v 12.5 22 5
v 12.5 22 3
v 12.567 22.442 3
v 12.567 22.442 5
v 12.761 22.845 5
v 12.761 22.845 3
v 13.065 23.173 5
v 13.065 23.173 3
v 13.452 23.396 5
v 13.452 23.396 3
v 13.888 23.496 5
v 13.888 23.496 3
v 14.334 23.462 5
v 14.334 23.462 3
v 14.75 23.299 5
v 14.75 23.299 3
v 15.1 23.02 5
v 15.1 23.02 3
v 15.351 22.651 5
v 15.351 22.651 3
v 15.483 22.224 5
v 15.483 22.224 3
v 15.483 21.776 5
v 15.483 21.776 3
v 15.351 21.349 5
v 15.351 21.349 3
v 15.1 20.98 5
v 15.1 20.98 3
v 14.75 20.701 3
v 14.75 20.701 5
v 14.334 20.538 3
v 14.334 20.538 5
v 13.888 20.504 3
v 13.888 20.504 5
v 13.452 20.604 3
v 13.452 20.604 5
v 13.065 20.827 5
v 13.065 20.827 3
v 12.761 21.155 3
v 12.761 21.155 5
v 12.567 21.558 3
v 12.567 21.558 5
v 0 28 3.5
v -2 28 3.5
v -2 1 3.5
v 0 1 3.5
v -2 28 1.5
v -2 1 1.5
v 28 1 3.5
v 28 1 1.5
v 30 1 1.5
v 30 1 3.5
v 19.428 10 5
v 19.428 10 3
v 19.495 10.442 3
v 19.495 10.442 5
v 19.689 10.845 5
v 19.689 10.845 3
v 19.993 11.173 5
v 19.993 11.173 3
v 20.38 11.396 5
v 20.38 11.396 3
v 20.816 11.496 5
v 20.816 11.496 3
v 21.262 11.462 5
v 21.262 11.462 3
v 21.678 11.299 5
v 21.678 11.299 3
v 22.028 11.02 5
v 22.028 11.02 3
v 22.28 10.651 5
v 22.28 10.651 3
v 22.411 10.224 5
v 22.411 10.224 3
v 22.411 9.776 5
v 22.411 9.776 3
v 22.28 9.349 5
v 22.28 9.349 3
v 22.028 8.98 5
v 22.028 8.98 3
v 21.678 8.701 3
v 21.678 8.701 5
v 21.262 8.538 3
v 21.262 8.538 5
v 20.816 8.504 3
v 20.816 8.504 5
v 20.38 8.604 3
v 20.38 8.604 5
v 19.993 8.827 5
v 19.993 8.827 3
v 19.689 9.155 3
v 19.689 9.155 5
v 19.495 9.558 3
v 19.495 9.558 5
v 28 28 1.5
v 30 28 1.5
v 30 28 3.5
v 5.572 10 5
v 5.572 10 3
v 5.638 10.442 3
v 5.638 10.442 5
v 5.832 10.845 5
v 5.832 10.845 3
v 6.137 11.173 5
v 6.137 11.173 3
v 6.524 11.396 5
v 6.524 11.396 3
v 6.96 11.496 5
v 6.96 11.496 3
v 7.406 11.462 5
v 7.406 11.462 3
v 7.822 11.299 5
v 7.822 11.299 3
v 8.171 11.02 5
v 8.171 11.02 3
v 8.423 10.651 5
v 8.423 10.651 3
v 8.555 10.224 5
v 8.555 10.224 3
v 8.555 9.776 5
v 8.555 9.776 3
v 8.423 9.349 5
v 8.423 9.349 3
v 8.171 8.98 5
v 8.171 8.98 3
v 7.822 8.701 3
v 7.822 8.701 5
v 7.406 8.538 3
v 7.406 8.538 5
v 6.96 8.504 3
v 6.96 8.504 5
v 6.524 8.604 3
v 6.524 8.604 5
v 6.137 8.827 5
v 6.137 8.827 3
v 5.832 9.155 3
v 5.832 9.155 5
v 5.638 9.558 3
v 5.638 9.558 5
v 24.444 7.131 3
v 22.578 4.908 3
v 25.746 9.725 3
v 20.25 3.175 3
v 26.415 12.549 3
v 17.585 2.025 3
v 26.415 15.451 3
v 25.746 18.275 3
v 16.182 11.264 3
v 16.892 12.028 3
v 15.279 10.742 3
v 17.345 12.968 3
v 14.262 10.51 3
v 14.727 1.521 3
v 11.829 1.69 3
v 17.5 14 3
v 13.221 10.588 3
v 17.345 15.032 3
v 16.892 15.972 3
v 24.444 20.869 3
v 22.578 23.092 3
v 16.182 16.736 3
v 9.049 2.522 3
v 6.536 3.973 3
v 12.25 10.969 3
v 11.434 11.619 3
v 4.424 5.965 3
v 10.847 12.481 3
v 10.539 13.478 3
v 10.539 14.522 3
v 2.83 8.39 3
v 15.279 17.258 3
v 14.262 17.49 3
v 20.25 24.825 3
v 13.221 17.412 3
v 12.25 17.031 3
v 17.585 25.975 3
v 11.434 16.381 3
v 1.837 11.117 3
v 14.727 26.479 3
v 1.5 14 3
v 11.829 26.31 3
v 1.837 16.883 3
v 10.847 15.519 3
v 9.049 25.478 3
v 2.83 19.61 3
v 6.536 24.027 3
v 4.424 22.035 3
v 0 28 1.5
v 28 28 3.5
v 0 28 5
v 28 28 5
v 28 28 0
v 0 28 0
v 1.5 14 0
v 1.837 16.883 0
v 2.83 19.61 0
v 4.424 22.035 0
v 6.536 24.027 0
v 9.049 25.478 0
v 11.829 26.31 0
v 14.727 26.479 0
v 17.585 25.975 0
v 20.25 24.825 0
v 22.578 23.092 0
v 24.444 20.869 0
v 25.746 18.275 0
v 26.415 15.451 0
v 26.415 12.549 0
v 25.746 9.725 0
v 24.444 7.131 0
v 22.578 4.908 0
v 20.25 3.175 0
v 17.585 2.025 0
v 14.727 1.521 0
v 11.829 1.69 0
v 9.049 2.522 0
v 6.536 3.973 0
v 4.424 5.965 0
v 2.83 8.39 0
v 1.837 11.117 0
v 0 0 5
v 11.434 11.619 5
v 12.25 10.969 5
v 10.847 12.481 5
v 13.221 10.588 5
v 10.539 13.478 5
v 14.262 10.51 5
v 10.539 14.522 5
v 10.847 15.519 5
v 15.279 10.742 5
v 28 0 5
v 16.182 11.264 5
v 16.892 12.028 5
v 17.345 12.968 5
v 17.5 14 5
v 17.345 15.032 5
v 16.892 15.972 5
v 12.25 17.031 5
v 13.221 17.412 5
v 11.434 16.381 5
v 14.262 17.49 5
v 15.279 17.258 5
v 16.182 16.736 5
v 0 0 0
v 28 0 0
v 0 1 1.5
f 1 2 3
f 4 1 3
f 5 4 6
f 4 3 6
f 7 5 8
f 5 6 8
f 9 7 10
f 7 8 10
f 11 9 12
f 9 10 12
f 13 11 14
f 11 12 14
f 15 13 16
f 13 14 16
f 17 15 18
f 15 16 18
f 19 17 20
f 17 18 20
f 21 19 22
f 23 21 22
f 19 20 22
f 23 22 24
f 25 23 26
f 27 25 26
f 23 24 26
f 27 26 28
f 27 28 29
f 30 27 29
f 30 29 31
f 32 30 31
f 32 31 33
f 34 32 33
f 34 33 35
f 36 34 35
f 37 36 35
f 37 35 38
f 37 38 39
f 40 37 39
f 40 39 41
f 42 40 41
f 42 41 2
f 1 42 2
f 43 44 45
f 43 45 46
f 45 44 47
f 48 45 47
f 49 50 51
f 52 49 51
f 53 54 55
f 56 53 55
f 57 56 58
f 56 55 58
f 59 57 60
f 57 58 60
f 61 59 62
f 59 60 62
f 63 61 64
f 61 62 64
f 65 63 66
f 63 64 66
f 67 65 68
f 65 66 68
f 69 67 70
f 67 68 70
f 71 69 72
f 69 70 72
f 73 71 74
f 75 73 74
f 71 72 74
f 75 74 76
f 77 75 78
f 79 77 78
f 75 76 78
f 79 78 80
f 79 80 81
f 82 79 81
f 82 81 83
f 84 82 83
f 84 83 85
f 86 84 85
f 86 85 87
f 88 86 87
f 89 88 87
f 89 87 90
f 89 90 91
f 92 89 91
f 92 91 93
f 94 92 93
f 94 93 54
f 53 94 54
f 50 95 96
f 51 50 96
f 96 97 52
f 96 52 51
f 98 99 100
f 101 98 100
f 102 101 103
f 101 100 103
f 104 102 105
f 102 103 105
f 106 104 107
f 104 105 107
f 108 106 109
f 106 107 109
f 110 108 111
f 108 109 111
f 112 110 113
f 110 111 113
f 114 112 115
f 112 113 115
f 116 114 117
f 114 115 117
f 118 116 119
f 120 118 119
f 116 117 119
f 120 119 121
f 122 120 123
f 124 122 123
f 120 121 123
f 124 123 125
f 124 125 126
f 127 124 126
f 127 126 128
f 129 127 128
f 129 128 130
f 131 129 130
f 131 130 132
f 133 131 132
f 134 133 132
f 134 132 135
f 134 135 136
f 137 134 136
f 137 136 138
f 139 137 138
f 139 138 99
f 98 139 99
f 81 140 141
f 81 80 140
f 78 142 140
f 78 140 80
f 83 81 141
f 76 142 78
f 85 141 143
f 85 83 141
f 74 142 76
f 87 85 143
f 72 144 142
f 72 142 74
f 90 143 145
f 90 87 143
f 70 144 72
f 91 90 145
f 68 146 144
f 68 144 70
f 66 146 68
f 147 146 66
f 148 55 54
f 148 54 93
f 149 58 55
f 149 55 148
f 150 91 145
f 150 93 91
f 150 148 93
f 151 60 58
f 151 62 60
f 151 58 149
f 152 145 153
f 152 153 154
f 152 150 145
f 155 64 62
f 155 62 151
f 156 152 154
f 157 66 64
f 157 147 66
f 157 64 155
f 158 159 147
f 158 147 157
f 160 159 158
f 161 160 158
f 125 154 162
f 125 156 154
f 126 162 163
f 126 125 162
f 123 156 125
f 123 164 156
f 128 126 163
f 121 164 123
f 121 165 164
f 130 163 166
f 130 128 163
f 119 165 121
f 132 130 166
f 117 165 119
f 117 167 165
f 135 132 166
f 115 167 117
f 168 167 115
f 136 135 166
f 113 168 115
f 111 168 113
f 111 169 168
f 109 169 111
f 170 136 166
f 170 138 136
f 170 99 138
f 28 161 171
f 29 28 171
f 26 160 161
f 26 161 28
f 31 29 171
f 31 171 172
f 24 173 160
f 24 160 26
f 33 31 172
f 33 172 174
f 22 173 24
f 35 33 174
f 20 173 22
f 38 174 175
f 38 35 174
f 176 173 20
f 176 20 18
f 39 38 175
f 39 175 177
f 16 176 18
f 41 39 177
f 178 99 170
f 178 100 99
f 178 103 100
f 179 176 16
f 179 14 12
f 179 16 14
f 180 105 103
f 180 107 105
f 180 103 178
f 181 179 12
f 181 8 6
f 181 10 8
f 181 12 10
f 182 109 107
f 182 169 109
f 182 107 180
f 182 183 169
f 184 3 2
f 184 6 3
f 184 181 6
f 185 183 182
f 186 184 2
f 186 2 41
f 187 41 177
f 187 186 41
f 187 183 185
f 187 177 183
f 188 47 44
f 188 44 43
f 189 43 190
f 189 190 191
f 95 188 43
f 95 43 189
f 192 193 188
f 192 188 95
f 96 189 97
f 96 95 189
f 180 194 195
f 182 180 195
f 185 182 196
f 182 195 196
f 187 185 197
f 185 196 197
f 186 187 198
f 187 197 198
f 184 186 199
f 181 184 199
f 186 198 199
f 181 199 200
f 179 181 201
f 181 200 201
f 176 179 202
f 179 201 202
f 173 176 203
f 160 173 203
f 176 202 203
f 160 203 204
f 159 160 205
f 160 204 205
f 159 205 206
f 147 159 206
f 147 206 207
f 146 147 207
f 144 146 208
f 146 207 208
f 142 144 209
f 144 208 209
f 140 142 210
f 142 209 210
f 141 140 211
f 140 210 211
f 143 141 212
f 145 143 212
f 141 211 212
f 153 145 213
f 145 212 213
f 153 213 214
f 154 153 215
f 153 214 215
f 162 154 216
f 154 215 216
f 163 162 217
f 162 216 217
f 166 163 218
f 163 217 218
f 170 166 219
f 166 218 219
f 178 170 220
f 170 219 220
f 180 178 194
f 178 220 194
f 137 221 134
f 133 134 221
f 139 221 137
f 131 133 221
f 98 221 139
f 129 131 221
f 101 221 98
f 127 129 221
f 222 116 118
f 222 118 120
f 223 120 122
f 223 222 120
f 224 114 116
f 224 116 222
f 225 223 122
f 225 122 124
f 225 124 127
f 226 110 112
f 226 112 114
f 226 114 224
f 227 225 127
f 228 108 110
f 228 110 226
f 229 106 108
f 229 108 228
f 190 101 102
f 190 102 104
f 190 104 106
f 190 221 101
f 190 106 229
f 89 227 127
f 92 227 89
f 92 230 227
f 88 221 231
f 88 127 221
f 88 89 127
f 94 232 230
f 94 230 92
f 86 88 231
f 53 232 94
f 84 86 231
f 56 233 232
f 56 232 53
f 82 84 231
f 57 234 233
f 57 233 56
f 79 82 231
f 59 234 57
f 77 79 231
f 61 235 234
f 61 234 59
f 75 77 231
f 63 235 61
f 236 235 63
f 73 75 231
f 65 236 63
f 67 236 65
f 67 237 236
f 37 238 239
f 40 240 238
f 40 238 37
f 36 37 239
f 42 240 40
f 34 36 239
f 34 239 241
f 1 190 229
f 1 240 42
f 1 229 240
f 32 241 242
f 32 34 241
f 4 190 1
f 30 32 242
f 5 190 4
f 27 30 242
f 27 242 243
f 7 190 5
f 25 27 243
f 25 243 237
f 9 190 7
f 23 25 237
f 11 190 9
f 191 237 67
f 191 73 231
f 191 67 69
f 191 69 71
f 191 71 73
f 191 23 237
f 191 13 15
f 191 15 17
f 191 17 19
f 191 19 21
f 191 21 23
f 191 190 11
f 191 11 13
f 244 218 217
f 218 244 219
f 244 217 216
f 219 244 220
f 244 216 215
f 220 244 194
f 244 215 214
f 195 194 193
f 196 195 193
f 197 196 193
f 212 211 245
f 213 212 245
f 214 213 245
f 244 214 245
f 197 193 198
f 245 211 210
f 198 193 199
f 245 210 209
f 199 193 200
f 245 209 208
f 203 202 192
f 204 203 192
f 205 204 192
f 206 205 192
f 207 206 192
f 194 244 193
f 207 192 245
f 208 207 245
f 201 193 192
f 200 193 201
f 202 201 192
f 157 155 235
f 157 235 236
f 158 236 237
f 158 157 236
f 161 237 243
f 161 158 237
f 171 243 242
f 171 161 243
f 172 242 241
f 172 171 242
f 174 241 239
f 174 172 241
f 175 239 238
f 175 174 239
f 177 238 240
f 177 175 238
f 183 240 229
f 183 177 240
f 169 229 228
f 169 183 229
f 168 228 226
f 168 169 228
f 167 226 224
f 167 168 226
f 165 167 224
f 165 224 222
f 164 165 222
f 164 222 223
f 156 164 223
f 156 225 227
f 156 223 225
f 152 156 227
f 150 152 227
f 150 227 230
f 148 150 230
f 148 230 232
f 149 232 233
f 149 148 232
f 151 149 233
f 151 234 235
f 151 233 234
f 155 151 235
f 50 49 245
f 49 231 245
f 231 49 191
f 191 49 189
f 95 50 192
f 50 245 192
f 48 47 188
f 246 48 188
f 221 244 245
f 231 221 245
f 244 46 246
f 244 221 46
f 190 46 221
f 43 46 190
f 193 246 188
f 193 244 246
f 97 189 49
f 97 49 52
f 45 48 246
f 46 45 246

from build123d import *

# Parameters (mm, degrees)
ESQUISSE1_W                  = 28
ESQUISSE1_H                  = 28
BOSS_EXTRU_1_DEPTH           = 5
ENL_V_MAT_EXTRU_1_DEPTH      = 40.912404087
ENL_V_MAT_EXTRU_1_DEPTH_BACK = 40.912404087
ESQUISSE2_R                  = 3.5
ESQUISSE3_W                  = 2
ESQUISSE3_H                  = 2
BOSS_EXTRU_2_DEPTH           = 27
ESQUISSE5_R                  = 1.5
ENL_V_MAT_EXTRU_3_DEPTH      = 42.340053217
ESQUISSE6_R                  = 12.5
ENL_V_MAT_EXTRU_4_DEPTH      = 3


with BuildPart() as part:
    # Esquisse1 → Boss.-Extru.1 (new body)
    with BuildSketch(Plane.XY):
        with Locations((14, 14)):
            Rectangle(ESQUISSE1_W, ESQUISSE1_H)
    extrude(amount=BOSS_EXTRU_1_DEPTH)

    # Esquisse2 → Enlèv. mat.-Extru.1 (cut, two sides: drawn at the far end of the back side and taken through both)
    with BuildSketch(Plane.XY.offset(5).offset(-ENL_V_MAT_EXTRU_1_DEPTH_BACK)):
        with Locations((14, 14)):
            Circle(ESQUISSE2_R)
    extrude(amount=ENL_V_MAT_EXTRU_1_DEPTH + ENL_V_MAT_EXTRU_1_DEPTH_BACK, mode=Mode.SUBTRACT)

    # Esquisse3 → Boss.-Extru.2 (add)
    with BuildSketch(Plane(origin=(0, 28, 0), x_dir=(1, 0, 0), z_dir=(0, 1, 0))):
        with Locations((-1, -2.5)):
            Rectangle(ESQUISSE3_W, ESQUISSE3_H)
        with Locations((29, -2.5)):
            Rectangle(ESQUISSE3_W, ESQUISSE3_H)
    extrude(amount=-BOSS_EXTRU_2_DEPTH)

    # Esquisse5 → Enlèv. mat.-Extru.3 (cut, through all)
    with BuildSketch(Plane(origin=(0, 0, 0), x_dir=(-1, 0, 0), z_dir=(0, 0, -1))):
        with Locations((-14, 22)):
            Circle(ESQUISSE5_R)
        with Locations((-20.92820323, 10)):
            Circle(ESQUISSE5_R)
        with Locations((-7.07179677, 10)):
            Circle(ESQUISSE5_R)
    extrude(amount=-ENL_V_MAT_EXTRU_3_DEPTH, mode=Mode.SUBTRACT)

    # Esquisse6 → Enlèv. mat.-Extru.4 (cut)
    with BuildSketch(Plane(origin=(0, 0, 0), x_dir=(-1, 0, 0), z_dir=(0, 0, -1))):
        with Locations((-14, 14)):
            Circle(ESQUISSE6_R)
    extrude(amount=-ENL_V_MAT_EXTRU_4_DEPTH, mode=Mode.SUBTRACT)


solid = part.part
